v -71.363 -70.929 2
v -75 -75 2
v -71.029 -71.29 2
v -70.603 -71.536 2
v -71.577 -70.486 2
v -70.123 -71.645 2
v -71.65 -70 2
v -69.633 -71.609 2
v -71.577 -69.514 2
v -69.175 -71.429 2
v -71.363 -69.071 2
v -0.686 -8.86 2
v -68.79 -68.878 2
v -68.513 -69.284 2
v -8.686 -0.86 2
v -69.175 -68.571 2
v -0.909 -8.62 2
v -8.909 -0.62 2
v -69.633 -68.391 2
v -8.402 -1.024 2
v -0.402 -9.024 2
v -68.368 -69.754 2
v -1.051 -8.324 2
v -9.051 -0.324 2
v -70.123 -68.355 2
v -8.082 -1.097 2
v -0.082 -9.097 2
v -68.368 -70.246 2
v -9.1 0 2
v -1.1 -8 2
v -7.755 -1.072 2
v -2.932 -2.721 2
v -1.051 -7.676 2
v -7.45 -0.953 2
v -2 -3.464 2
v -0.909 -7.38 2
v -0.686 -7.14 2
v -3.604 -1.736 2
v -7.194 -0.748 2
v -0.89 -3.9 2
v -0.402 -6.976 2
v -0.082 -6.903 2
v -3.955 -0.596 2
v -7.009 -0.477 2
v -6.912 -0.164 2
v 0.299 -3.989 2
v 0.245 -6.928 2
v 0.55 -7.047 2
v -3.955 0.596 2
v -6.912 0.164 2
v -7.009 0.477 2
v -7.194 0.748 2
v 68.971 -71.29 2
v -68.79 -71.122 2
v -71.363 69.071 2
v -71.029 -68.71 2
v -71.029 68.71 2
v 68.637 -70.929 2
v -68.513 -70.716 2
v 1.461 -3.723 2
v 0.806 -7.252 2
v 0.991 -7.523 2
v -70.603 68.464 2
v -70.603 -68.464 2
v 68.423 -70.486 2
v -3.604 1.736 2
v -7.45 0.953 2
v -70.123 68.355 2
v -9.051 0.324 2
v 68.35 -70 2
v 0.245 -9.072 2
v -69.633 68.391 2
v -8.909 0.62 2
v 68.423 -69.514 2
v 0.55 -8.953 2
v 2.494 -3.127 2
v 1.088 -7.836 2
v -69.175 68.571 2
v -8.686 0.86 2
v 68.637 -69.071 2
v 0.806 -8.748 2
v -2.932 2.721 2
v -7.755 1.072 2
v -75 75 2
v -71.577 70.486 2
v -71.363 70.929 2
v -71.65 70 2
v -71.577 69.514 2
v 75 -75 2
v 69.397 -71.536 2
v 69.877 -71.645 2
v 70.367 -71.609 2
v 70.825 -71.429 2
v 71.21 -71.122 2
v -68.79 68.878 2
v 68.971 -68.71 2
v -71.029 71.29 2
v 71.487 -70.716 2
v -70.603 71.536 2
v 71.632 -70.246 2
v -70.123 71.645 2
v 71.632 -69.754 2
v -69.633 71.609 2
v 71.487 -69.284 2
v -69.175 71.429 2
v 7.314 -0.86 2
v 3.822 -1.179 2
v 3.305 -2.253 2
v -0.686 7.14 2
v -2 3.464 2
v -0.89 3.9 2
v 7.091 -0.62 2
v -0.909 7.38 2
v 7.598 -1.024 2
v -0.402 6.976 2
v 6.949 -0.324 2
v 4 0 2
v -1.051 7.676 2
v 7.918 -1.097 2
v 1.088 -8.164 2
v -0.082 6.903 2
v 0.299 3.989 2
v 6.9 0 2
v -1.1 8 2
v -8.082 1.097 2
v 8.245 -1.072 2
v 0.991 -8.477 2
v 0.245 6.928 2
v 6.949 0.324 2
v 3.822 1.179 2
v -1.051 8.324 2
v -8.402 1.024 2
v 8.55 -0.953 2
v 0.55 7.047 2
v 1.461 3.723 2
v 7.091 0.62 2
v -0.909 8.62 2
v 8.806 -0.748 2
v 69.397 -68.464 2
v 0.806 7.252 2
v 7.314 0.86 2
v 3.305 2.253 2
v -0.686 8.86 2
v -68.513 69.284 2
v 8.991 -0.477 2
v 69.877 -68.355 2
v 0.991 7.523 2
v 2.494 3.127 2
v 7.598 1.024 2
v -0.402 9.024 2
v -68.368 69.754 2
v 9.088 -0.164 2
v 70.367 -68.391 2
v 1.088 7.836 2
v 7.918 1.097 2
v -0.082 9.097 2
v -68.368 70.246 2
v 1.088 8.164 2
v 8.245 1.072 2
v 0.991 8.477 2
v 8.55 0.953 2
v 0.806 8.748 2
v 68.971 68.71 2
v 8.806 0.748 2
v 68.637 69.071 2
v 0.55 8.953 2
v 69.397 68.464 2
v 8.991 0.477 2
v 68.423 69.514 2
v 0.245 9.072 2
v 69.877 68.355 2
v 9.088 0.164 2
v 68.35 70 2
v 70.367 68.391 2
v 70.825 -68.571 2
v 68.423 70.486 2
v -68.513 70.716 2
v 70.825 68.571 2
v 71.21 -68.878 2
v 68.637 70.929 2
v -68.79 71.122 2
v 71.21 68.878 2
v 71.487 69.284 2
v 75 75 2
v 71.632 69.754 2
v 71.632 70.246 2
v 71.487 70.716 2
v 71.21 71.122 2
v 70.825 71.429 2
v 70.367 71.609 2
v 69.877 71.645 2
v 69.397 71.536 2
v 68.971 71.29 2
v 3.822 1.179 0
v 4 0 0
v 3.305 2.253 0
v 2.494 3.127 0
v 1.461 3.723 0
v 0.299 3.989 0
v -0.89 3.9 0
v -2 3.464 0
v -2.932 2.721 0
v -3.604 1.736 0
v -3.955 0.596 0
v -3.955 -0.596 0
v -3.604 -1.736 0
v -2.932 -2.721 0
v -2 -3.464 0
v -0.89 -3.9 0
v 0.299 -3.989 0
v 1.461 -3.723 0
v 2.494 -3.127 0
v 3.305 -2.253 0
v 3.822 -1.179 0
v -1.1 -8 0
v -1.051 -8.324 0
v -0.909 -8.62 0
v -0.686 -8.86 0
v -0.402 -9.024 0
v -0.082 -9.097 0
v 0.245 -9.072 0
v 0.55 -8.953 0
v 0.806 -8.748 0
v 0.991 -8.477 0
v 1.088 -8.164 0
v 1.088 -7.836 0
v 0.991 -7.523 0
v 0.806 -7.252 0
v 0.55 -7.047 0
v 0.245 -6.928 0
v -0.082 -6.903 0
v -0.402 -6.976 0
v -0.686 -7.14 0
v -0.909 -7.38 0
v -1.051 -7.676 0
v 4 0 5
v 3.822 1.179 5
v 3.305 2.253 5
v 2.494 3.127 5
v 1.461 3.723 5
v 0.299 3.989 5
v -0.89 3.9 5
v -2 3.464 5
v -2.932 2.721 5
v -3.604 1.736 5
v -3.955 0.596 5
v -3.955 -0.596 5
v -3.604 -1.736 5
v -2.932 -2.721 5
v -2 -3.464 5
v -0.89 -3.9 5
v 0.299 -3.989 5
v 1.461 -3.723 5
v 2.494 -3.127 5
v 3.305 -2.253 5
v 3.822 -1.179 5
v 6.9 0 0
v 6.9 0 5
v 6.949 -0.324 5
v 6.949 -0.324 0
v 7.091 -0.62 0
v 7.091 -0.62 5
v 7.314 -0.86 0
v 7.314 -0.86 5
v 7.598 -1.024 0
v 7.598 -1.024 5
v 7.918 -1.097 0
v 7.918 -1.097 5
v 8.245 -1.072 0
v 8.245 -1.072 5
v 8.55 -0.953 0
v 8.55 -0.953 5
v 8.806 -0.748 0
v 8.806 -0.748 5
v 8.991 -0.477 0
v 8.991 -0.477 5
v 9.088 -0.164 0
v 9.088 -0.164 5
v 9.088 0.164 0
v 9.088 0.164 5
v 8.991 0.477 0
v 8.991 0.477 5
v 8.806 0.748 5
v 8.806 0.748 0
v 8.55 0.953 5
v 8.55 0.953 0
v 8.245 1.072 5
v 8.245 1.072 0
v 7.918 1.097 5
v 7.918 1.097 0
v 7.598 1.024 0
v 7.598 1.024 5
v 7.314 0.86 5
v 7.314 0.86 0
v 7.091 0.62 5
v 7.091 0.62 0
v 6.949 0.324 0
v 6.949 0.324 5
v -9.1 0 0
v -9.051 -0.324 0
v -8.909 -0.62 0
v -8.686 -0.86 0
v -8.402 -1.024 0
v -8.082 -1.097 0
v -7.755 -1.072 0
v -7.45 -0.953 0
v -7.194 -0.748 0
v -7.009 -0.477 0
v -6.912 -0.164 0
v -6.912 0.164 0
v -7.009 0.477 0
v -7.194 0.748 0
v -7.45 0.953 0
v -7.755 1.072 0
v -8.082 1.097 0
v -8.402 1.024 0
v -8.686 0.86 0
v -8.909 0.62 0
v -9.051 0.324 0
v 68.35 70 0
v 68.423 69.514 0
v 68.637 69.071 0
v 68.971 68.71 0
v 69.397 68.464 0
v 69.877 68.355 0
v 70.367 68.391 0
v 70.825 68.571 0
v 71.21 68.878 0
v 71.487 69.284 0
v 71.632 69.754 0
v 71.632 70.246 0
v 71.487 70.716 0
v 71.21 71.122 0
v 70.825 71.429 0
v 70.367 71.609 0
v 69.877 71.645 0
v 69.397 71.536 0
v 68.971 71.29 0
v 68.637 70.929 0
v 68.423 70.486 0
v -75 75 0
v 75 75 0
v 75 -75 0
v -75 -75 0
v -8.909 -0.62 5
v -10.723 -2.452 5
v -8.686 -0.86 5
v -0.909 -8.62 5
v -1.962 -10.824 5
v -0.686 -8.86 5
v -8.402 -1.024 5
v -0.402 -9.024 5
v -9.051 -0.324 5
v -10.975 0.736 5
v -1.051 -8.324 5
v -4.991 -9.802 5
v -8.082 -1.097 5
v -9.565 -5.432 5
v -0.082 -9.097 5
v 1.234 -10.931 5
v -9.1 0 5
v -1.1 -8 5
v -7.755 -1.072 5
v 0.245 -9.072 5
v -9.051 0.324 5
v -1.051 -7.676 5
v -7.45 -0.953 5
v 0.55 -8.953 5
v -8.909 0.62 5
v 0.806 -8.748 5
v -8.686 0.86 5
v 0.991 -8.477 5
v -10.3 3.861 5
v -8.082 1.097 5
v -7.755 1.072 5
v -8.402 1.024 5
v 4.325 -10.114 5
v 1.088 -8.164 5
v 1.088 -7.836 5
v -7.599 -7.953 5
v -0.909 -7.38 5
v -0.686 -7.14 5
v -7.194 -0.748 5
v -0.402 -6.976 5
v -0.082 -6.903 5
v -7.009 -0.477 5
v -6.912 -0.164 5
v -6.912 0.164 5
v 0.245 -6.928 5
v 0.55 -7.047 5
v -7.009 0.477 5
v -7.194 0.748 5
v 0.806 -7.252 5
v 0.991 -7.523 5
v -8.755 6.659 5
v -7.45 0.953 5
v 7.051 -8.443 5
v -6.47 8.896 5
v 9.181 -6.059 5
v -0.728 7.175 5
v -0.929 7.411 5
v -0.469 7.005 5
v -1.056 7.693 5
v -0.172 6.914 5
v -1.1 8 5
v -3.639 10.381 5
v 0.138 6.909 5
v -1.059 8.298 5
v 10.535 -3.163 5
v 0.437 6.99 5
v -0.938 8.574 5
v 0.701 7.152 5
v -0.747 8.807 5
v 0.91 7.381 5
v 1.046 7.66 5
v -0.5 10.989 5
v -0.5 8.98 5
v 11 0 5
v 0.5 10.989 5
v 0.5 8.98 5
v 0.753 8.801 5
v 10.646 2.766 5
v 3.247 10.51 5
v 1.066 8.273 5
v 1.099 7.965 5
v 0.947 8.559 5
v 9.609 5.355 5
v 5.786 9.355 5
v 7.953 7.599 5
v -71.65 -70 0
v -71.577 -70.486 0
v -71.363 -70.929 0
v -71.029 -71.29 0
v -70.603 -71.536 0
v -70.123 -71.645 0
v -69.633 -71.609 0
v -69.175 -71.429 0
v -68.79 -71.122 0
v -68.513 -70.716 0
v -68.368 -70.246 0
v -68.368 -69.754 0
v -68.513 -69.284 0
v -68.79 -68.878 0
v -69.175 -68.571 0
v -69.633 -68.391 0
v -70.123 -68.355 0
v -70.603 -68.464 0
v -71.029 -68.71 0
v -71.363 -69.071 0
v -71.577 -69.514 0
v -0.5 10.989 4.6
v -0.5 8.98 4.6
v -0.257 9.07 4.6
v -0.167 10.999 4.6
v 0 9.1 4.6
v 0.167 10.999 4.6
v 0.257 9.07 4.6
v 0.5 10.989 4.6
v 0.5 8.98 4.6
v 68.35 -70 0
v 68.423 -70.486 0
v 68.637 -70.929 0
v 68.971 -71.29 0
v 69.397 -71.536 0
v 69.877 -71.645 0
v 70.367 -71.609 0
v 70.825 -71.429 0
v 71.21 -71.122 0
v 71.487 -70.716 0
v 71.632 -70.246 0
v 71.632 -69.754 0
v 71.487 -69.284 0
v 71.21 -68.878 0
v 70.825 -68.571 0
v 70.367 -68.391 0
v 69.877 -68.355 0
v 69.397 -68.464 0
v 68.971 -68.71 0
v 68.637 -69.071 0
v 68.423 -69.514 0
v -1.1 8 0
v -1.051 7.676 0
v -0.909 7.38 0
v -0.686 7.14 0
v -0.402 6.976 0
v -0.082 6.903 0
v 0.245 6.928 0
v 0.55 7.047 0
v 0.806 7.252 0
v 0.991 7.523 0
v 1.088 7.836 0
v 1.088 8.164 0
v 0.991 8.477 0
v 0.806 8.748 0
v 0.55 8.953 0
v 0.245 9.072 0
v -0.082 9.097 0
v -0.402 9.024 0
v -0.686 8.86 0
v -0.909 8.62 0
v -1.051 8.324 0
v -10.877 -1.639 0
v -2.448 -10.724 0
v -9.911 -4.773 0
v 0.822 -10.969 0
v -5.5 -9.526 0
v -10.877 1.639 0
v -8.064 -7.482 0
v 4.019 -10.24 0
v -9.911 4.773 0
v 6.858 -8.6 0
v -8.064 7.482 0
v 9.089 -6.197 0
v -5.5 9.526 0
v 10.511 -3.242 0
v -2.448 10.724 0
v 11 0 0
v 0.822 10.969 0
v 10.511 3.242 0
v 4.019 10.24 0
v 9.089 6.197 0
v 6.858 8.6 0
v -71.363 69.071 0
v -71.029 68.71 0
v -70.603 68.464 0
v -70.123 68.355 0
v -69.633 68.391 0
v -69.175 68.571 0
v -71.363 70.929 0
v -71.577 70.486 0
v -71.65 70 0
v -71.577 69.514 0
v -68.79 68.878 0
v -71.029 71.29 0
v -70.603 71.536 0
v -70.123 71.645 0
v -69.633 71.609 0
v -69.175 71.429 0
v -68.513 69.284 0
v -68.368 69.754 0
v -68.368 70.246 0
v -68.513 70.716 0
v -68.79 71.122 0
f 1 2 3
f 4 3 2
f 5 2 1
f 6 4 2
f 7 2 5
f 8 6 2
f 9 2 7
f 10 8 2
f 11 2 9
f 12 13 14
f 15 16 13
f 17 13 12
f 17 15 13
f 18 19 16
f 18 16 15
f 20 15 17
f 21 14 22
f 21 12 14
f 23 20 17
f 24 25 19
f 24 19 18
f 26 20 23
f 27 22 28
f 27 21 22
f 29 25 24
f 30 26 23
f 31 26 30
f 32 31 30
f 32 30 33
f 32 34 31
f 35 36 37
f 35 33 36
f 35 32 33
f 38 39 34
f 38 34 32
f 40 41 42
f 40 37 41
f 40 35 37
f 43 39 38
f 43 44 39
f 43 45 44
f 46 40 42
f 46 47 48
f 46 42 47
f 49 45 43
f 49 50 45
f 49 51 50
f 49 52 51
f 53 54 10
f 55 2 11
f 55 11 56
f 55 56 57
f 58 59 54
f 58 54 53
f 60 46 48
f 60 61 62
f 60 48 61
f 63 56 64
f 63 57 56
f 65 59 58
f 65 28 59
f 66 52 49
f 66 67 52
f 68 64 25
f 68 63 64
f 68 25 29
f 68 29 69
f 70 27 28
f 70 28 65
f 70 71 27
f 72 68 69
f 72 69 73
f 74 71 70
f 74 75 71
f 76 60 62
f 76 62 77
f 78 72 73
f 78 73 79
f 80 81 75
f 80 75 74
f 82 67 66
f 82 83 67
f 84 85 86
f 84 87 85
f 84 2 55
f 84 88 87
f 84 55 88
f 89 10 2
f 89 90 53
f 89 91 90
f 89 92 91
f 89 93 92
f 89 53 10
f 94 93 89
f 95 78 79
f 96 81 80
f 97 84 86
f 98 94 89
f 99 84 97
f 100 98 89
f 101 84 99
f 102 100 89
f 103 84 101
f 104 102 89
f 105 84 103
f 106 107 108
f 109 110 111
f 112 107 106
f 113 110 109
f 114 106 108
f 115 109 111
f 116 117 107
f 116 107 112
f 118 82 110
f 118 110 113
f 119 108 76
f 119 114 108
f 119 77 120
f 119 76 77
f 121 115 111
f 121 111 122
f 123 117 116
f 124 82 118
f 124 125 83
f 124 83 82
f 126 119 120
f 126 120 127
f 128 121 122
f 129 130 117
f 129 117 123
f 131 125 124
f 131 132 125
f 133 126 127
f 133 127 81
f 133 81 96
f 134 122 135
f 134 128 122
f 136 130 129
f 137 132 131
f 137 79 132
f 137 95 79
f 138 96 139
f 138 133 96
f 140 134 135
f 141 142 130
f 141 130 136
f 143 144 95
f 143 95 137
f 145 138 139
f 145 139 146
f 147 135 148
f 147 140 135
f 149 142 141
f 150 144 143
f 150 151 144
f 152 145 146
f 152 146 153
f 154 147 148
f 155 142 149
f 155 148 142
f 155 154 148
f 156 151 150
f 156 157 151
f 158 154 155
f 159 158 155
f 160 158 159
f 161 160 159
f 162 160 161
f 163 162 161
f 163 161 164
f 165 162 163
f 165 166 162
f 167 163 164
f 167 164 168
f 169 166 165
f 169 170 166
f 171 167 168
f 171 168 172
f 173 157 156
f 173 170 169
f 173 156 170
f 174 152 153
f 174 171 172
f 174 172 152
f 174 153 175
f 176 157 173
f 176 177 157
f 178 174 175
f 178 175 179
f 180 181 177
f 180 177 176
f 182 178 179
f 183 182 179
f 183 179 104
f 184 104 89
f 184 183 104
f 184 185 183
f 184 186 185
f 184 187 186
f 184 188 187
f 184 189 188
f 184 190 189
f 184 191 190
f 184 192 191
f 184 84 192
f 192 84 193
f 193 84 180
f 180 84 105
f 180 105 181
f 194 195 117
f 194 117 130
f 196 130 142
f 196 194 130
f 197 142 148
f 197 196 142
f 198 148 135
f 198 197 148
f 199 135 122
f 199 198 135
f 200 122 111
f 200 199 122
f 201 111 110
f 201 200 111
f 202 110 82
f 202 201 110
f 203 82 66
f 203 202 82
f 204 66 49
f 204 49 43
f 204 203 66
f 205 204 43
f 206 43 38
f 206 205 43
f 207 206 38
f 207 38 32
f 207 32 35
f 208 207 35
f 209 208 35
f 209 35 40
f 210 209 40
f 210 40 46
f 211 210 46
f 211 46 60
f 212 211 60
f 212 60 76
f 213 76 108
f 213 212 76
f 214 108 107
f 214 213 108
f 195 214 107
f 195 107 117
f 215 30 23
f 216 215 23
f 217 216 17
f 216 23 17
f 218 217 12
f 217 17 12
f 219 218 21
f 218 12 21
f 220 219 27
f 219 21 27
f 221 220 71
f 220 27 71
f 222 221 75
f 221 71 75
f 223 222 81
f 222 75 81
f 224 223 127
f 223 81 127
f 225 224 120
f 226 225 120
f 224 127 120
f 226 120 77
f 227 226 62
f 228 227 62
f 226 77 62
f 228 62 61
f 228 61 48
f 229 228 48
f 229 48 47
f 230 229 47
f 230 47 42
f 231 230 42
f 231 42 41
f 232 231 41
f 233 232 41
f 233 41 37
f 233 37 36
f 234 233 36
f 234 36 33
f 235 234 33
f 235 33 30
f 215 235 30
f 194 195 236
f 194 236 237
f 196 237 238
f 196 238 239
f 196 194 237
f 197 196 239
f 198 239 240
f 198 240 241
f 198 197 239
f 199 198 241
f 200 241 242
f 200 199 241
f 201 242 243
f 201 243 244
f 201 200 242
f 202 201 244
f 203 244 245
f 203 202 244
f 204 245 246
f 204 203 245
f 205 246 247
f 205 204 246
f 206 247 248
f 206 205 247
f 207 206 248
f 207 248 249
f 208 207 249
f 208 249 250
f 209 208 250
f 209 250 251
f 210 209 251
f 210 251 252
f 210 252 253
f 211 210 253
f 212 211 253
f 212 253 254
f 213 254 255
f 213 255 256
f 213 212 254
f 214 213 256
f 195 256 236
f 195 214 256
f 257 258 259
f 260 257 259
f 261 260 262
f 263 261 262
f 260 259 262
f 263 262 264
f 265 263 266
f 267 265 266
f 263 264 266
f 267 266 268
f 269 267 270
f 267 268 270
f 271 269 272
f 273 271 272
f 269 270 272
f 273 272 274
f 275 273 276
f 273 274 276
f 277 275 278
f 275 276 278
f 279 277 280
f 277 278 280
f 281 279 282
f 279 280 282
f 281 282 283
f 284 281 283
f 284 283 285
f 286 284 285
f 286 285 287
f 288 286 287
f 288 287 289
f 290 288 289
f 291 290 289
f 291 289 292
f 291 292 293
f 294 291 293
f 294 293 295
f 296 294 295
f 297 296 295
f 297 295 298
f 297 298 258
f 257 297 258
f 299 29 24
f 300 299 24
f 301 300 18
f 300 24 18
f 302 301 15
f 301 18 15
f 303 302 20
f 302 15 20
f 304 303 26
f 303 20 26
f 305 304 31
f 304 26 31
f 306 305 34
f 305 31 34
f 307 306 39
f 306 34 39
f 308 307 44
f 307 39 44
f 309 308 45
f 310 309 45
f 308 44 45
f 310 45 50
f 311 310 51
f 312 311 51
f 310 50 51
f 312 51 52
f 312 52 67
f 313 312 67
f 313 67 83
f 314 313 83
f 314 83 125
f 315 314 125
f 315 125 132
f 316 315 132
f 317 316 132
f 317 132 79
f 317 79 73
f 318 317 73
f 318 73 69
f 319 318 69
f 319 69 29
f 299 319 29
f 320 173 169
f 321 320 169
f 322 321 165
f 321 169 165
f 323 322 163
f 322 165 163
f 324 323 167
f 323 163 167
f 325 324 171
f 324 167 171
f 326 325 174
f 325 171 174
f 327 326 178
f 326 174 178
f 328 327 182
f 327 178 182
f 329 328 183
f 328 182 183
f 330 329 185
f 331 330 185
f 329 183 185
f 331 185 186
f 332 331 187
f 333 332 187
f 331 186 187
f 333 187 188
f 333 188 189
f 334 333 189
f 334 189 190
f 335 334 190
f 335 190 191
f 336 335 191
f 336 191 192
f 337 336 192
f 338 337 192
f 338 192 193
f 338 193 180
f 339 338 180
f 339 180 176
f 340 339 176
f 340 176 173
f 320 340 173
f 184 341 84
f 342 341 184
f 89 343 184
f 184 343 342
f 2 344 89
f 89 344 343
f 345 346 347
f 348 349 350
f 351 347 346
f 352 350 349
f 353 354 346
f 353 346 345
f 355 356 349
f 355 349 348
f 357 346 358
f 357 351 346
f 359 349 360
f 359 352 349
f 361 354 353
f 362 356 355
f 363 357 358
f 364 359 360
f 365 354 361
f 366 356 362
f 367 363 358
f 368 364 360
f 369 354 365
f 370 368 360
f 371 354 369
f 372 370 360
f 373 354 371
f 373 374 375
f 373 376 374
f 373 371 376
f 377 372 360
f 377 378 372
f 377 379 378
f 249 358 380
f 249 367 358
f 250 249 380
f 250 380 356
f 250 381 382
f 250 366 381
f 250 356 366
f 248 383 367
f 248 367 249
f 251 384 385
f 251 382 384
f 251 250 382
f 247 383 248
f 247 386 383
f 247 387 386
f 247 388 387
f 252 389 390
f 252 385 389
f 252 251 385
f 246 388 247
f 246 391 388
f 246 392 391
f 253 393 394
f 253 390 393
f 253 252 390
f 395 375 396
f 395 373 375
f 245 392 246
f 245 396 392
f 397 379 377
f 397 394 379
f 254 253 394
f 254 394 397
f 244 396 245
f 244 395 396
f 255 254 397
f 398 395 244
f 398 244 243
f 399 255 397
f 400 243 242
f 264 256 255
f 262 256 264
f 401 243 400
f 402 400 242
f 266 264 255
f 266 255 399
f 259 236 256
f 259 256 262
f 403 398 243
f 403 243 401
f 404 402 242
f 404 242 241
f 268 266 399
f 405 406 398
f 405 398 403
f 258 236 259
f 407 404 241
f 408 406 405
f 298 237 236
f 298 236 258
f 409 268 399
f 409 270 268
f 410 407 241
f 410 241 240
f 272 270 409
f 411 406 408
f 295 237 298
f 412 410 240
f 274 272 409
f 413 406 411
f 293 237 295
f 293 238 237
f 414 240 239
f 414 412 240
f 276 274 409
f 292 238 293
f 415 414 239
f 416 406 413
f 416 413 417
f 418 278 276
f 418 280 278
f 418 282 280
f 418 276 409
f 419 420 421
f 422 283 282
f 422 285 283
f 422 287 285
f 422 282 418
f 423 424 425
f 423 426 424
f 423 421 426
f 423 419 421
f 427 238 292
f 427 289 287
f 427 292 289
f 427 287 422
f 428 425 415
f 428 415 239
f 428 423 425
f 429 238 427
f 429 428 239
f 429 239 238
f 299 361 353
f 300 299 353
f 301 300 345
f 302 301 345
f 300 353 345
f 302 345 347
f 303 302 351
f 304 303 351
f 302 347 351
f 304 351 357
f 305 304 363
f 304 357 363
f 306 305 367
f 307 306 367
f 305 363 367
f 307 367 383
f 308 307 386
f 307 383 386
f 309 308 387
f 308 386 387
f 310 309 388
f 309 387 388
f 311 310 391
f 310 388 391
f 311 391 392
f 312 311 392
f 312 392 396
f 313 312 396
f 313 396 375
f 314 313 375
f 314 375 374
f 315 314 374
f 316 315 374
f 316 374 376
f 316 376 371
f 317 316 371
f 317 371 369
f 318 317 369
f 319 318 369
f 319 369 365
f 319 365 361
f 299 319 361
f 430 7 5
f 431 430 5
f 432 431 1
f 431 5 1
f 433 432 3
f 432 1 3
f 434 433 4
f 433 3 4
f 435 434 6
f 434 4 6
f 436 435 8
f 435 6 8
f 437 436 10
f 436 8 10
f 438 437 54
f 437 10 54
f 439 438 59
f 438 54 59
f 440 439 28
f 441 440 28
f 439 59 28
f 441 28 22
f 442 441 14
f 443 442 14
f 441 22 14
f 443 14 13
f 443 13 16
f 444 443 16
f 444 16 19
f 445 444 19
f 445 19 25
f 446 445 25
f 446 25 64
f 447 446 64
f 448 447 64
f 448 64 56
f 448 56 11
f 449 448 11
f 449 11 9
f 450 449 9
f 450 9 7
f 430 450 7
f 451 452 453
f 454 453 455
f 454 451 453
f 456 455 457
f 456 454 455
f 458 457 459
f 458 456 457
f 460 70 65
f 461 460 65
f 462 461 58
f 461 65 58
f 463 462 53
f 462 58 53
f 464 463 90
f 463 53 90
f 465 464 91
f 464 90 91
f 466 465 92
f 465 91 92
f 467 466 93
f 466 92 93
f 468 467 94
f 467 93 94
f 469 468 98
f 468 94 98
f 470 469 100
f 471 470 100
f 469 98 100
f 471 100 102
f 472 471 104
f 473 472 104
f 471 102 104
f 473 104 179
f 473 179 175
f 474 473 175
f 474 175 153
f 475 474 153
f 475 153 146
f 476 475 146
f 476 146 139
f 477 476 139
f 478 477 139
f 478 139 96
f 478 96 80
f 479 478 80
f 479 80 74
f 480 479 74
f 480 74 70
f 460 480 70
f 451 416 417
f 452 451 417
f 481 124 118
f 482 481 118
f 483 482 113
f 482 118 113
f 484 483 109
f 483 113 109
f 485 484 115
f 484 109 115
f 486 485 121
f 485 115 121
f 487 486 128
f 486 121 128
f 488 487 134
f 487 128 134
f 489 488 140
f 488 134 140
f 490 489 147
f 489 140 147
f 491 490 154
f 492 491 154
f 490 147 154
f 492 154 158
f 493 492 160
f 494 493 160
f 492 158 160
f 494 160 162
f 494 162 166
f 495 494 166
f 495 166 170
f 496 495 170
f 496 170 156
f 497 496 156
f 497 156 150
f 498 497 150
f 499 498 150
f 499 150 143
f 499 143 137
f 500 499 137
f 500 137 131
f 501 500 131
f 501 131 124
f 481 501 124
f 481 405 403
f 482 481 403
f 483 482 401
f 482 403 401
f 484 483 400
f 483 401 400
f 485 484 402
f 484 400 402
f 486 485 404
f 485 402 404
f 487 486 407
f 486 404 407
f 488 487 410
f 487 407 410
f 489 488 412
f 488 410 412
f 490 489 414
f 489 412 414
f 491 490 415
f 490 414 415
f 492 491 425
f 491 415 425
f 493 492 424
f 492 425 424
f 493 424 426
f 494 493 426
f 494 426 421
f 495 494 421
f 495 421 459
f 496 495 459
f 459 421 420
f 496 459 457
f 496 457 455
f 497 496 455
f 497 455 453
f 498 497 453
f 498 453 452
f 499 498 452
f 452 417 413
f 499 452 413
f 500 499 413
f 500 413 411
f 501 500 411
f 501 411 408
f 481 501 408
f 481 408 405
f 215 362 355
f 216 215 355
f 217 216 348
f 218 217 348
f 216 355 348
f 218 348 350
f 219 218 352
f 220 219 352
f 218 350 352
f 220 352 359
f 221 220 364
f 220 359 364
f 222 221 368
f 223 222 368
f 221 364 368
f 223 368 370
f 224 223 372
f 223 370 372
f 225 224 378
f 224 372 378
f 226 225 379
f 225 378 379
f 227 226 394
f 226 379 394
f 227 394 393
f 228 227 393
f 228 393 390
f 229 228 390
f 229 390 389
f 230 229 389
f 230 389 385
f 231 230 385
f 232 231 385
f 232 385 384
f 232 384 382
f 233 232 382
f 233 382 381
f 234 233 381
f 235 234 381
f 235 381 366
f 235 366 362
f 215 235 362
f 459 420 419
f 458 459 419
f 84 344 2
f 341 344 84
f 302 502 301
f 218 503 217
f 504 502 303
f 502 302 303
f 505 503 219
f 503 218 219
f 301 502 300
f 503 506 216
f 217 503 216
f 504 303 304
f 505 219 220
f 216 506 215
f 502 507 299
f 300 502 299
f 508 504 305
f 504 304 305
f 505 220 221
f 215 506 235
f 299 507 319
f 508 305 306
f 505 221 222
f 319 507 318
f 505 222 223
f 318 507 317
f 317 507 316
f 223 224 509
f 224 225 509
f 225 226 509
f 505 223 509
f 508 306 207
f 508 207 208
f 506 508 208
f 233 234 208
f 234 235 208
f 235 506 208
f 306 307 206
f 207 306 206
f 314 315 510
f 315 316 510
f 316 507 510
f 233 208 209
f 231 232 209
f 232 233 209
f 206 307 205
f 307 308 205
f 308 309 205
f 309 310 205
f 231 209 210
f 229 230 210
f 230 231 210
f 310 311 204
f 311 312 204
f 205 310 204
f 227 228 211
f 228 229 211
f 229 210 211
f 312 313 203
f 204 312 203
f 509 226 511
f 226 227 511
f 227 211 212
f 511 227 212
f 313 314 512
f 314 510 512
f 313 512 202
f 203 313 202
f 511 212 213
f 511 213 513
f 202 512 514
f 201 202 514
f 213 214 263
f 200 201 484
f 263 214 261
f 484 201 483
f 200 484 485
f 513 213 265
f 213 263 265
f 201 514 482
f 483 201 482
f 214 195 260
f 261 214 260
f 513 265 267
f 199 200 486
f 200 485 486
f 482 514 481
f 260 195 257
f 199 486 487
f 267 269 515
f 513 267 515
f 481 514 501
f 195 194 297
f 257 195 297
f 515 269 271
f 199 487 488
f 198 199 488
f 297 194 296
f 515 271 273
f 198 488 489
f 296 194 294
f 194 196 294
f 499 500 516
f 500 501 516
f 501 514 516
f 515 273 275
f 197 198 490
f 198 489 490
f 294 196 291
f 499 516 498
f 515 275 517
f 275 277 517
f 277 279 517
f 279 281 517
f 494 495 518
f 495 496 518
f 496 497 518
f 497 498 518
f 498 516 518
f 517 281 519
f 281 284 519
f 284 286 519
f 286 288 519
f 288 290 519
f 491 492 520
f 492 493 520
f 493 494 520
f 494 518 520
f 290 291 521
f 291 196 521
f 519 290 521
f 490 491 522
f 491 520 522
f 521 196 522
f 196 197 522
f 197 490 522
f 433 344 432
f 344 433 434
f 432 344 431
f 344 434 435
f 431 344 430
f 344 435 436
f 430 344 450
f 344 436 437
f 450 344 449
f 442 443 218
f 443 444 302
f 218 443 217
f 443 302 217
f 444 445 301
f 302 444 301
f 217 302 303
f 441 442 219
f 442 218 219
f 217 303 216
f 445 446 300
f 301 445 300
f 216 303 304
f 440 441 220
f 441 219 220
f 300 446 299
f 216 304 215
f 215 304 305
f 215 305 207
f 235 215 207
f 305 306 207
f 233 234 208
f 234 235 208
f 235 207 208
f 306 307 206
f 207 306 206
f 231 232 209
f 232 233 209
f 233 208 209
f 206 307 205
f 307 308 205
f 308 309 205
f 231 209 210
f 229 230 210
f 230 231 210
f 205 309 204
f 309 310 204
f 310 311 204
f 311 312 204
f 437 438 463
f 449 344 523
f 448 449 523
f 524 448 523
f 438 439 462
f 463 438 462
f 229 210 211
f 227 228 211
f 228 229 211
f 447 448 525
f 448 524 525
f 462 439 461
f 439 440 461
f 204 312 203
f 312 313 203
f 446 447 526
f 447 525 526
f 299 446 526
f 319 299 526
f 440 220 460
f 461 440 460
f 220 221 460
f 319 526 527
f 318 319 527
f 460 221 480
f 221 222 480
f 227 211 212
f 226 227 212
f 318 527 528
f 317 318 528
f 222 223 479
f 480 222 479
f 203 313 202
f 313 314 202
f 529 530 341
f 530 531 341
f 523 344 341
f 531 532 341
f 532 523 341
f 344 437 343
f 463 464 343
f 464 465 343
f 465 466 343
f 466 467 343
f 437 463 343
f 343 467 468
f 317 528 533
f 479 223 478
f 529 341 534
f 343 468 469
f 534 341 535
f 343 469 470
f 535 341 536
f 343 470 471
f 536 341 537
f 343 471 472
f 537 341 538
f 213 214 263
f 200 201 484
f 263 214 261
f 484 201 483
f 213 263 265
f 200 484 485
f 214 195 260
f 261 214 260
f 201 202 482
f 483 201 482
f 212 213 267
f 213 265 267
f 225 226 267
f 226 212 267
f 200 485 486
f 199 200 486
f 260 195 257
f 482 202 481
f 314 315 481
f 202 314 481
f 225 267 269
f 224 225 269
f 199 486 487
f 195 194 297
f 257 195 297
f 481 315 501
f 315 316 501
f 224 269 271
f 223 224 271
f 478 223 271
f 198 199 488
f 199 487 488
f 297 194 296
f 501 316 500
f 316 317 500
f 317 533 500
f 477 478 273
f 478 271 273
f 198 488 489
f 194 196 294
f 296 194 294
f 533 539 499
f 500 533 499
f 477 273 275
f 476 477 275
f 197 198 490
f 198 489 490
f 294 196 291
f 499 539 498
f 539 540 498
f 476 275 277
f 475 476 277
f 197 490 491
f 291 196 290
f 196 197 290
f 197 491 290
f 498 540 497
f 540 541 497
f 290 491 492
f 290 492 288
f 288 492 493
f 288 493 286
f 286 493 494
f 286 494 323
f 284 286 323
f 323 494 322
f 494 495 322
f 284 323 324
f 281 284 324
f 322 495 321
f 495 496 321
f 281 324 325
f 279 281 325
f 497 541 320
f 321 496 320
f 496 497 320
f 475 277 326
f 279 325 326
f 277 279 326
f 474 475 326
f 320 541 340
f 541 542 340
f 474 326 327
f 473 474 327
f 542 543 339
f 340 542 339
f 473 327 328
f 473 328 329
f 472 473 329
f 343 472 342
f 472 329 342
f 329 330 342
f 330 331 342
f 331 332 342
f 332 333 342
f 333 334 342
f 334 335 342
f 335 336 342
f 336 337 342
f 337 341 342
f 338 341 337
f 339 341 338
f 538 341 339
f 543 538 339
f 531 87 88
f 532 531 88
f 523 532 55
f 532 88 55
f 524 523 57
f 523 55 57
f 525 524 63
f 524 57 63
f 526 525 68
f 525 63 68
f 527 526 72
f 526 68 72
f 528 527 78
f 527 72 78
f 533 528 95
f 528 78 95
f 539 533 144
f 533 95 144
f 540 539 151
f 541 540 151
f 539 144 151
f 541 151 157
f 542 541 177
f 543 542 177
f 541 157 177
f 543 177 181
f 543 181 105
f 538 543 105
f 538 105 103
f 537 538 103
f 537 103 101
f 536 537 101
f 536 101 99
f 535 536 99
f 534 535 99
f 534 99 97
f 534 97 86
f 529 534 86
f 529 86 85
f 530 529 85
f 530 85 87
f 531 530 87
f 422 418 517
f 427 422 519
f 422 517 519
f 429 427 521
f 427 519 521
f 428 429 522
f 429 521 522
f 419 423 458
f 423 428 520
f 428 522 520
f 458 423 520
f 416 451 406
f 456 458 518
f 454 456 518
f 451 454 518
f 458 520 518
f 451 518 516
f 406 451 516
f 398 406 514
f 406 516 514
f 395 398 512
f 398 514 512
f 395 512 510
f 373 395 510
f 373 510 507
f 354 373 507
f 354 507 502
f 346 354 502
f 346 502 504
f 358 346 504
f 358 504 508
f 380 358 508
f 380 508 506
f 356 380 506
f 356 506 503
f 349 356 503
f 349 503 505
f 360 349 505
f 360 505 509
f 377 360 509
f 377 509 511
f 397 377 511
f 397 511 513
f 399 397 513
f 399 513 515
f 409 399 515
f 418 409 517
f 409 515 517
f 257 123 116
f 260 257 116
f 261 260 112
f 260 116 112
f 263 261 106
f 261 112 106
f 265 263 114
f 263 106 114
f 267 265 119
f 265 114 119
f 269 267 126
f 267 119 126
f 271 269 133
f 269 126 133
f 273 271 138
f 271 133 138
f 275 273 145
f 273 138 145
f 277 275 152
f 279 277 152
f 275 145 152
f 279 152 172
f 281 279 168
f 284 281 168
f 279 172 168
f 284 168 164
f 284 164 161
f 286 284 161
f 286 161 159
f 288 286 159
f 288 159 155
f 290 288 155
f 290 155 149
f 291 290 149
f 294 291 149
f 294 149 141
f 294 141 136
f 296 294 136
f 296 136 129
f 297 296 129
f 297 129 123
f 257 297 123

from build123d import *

# Parameters (mm, degrees)
F0_W     = 150
F0_H     = 150
F0_R     = 4
F1_DEPTH = 2
F2_D     = 2.2
F3_D     = 3.3
F4_R     = 11
F4_R_2   = 4
F5_DEPTH = 5
F6_D     = 2.2
F8_DEPTH = 0.4


with BuildPart() as f1:
    # F0 (on Top) → F1 (new body)
    with BuildSketch(Plane.XY):
        Rectangle(F0_W, F0_H)
        Circle(F0_R, mode=Mode.SUBTRACT)
    extrude(amount=F1_DEPTH)

    # F2 (through all)
    with Locations(Plane(origin=(0, 0, 0), x_dir=(1, 0, 0), z_dir=(0, 0, -1))):
        with Locations((0, -8), (-8, 0), (0, 8), (8, 0)):
            Hole(F2_D / 2)

    # F3 (through all)
    with Locations(Plane(origin=(0, 0, 0), x_dir=(1, 0, 0), z_dir=(0, 0, -1))):
        with Locations((-70, -70), (-70, 70), (70, 70), (70, -70)):
            Hole(F3_D / 2)


with BuildPart() as f5:
    # F4 (on Top) → F5 (new body)
    with BuildSketch(Plane.XY):
        Circle(F4_R)
        Circle(F4_R_2, mode=Mode.SUBTRACT)
    extrude(amount=F5_DEPTH)

    # F6 (through all)
    with Locations(Plane(origin=(0, 0, 0), x_dir=(1, 0, 0), z_dir=(0, 0, -1))):
        with Locations((0, 8), (8, 0), (0, -8), (-8, 0)):
            Hole(F6_D / 2)

    # F7 (on face) → F8 (cut)
    with BuildSketch(Plane.XY.offset(5)):
        with BuildLine():
            Line((-0.5, 10.9886304879), (-0.5, 8.9797958971))
            ThreePointArc((-0.5, 8.9797958971), (0, 9.1), (0.5, 8.9797958971))
            Line((0.5, 8.9797958971), (0.5, 10.9886304879))
            ThreePointArc((0.5, 10.9886304879), (0, 11), (-0.5, 10.9886304879))
        make_face()
    extrude(amount=-F8_DEPTH, mode=Mode.SUBTRACT)


solid = Compound([f1.part, f5.part])
